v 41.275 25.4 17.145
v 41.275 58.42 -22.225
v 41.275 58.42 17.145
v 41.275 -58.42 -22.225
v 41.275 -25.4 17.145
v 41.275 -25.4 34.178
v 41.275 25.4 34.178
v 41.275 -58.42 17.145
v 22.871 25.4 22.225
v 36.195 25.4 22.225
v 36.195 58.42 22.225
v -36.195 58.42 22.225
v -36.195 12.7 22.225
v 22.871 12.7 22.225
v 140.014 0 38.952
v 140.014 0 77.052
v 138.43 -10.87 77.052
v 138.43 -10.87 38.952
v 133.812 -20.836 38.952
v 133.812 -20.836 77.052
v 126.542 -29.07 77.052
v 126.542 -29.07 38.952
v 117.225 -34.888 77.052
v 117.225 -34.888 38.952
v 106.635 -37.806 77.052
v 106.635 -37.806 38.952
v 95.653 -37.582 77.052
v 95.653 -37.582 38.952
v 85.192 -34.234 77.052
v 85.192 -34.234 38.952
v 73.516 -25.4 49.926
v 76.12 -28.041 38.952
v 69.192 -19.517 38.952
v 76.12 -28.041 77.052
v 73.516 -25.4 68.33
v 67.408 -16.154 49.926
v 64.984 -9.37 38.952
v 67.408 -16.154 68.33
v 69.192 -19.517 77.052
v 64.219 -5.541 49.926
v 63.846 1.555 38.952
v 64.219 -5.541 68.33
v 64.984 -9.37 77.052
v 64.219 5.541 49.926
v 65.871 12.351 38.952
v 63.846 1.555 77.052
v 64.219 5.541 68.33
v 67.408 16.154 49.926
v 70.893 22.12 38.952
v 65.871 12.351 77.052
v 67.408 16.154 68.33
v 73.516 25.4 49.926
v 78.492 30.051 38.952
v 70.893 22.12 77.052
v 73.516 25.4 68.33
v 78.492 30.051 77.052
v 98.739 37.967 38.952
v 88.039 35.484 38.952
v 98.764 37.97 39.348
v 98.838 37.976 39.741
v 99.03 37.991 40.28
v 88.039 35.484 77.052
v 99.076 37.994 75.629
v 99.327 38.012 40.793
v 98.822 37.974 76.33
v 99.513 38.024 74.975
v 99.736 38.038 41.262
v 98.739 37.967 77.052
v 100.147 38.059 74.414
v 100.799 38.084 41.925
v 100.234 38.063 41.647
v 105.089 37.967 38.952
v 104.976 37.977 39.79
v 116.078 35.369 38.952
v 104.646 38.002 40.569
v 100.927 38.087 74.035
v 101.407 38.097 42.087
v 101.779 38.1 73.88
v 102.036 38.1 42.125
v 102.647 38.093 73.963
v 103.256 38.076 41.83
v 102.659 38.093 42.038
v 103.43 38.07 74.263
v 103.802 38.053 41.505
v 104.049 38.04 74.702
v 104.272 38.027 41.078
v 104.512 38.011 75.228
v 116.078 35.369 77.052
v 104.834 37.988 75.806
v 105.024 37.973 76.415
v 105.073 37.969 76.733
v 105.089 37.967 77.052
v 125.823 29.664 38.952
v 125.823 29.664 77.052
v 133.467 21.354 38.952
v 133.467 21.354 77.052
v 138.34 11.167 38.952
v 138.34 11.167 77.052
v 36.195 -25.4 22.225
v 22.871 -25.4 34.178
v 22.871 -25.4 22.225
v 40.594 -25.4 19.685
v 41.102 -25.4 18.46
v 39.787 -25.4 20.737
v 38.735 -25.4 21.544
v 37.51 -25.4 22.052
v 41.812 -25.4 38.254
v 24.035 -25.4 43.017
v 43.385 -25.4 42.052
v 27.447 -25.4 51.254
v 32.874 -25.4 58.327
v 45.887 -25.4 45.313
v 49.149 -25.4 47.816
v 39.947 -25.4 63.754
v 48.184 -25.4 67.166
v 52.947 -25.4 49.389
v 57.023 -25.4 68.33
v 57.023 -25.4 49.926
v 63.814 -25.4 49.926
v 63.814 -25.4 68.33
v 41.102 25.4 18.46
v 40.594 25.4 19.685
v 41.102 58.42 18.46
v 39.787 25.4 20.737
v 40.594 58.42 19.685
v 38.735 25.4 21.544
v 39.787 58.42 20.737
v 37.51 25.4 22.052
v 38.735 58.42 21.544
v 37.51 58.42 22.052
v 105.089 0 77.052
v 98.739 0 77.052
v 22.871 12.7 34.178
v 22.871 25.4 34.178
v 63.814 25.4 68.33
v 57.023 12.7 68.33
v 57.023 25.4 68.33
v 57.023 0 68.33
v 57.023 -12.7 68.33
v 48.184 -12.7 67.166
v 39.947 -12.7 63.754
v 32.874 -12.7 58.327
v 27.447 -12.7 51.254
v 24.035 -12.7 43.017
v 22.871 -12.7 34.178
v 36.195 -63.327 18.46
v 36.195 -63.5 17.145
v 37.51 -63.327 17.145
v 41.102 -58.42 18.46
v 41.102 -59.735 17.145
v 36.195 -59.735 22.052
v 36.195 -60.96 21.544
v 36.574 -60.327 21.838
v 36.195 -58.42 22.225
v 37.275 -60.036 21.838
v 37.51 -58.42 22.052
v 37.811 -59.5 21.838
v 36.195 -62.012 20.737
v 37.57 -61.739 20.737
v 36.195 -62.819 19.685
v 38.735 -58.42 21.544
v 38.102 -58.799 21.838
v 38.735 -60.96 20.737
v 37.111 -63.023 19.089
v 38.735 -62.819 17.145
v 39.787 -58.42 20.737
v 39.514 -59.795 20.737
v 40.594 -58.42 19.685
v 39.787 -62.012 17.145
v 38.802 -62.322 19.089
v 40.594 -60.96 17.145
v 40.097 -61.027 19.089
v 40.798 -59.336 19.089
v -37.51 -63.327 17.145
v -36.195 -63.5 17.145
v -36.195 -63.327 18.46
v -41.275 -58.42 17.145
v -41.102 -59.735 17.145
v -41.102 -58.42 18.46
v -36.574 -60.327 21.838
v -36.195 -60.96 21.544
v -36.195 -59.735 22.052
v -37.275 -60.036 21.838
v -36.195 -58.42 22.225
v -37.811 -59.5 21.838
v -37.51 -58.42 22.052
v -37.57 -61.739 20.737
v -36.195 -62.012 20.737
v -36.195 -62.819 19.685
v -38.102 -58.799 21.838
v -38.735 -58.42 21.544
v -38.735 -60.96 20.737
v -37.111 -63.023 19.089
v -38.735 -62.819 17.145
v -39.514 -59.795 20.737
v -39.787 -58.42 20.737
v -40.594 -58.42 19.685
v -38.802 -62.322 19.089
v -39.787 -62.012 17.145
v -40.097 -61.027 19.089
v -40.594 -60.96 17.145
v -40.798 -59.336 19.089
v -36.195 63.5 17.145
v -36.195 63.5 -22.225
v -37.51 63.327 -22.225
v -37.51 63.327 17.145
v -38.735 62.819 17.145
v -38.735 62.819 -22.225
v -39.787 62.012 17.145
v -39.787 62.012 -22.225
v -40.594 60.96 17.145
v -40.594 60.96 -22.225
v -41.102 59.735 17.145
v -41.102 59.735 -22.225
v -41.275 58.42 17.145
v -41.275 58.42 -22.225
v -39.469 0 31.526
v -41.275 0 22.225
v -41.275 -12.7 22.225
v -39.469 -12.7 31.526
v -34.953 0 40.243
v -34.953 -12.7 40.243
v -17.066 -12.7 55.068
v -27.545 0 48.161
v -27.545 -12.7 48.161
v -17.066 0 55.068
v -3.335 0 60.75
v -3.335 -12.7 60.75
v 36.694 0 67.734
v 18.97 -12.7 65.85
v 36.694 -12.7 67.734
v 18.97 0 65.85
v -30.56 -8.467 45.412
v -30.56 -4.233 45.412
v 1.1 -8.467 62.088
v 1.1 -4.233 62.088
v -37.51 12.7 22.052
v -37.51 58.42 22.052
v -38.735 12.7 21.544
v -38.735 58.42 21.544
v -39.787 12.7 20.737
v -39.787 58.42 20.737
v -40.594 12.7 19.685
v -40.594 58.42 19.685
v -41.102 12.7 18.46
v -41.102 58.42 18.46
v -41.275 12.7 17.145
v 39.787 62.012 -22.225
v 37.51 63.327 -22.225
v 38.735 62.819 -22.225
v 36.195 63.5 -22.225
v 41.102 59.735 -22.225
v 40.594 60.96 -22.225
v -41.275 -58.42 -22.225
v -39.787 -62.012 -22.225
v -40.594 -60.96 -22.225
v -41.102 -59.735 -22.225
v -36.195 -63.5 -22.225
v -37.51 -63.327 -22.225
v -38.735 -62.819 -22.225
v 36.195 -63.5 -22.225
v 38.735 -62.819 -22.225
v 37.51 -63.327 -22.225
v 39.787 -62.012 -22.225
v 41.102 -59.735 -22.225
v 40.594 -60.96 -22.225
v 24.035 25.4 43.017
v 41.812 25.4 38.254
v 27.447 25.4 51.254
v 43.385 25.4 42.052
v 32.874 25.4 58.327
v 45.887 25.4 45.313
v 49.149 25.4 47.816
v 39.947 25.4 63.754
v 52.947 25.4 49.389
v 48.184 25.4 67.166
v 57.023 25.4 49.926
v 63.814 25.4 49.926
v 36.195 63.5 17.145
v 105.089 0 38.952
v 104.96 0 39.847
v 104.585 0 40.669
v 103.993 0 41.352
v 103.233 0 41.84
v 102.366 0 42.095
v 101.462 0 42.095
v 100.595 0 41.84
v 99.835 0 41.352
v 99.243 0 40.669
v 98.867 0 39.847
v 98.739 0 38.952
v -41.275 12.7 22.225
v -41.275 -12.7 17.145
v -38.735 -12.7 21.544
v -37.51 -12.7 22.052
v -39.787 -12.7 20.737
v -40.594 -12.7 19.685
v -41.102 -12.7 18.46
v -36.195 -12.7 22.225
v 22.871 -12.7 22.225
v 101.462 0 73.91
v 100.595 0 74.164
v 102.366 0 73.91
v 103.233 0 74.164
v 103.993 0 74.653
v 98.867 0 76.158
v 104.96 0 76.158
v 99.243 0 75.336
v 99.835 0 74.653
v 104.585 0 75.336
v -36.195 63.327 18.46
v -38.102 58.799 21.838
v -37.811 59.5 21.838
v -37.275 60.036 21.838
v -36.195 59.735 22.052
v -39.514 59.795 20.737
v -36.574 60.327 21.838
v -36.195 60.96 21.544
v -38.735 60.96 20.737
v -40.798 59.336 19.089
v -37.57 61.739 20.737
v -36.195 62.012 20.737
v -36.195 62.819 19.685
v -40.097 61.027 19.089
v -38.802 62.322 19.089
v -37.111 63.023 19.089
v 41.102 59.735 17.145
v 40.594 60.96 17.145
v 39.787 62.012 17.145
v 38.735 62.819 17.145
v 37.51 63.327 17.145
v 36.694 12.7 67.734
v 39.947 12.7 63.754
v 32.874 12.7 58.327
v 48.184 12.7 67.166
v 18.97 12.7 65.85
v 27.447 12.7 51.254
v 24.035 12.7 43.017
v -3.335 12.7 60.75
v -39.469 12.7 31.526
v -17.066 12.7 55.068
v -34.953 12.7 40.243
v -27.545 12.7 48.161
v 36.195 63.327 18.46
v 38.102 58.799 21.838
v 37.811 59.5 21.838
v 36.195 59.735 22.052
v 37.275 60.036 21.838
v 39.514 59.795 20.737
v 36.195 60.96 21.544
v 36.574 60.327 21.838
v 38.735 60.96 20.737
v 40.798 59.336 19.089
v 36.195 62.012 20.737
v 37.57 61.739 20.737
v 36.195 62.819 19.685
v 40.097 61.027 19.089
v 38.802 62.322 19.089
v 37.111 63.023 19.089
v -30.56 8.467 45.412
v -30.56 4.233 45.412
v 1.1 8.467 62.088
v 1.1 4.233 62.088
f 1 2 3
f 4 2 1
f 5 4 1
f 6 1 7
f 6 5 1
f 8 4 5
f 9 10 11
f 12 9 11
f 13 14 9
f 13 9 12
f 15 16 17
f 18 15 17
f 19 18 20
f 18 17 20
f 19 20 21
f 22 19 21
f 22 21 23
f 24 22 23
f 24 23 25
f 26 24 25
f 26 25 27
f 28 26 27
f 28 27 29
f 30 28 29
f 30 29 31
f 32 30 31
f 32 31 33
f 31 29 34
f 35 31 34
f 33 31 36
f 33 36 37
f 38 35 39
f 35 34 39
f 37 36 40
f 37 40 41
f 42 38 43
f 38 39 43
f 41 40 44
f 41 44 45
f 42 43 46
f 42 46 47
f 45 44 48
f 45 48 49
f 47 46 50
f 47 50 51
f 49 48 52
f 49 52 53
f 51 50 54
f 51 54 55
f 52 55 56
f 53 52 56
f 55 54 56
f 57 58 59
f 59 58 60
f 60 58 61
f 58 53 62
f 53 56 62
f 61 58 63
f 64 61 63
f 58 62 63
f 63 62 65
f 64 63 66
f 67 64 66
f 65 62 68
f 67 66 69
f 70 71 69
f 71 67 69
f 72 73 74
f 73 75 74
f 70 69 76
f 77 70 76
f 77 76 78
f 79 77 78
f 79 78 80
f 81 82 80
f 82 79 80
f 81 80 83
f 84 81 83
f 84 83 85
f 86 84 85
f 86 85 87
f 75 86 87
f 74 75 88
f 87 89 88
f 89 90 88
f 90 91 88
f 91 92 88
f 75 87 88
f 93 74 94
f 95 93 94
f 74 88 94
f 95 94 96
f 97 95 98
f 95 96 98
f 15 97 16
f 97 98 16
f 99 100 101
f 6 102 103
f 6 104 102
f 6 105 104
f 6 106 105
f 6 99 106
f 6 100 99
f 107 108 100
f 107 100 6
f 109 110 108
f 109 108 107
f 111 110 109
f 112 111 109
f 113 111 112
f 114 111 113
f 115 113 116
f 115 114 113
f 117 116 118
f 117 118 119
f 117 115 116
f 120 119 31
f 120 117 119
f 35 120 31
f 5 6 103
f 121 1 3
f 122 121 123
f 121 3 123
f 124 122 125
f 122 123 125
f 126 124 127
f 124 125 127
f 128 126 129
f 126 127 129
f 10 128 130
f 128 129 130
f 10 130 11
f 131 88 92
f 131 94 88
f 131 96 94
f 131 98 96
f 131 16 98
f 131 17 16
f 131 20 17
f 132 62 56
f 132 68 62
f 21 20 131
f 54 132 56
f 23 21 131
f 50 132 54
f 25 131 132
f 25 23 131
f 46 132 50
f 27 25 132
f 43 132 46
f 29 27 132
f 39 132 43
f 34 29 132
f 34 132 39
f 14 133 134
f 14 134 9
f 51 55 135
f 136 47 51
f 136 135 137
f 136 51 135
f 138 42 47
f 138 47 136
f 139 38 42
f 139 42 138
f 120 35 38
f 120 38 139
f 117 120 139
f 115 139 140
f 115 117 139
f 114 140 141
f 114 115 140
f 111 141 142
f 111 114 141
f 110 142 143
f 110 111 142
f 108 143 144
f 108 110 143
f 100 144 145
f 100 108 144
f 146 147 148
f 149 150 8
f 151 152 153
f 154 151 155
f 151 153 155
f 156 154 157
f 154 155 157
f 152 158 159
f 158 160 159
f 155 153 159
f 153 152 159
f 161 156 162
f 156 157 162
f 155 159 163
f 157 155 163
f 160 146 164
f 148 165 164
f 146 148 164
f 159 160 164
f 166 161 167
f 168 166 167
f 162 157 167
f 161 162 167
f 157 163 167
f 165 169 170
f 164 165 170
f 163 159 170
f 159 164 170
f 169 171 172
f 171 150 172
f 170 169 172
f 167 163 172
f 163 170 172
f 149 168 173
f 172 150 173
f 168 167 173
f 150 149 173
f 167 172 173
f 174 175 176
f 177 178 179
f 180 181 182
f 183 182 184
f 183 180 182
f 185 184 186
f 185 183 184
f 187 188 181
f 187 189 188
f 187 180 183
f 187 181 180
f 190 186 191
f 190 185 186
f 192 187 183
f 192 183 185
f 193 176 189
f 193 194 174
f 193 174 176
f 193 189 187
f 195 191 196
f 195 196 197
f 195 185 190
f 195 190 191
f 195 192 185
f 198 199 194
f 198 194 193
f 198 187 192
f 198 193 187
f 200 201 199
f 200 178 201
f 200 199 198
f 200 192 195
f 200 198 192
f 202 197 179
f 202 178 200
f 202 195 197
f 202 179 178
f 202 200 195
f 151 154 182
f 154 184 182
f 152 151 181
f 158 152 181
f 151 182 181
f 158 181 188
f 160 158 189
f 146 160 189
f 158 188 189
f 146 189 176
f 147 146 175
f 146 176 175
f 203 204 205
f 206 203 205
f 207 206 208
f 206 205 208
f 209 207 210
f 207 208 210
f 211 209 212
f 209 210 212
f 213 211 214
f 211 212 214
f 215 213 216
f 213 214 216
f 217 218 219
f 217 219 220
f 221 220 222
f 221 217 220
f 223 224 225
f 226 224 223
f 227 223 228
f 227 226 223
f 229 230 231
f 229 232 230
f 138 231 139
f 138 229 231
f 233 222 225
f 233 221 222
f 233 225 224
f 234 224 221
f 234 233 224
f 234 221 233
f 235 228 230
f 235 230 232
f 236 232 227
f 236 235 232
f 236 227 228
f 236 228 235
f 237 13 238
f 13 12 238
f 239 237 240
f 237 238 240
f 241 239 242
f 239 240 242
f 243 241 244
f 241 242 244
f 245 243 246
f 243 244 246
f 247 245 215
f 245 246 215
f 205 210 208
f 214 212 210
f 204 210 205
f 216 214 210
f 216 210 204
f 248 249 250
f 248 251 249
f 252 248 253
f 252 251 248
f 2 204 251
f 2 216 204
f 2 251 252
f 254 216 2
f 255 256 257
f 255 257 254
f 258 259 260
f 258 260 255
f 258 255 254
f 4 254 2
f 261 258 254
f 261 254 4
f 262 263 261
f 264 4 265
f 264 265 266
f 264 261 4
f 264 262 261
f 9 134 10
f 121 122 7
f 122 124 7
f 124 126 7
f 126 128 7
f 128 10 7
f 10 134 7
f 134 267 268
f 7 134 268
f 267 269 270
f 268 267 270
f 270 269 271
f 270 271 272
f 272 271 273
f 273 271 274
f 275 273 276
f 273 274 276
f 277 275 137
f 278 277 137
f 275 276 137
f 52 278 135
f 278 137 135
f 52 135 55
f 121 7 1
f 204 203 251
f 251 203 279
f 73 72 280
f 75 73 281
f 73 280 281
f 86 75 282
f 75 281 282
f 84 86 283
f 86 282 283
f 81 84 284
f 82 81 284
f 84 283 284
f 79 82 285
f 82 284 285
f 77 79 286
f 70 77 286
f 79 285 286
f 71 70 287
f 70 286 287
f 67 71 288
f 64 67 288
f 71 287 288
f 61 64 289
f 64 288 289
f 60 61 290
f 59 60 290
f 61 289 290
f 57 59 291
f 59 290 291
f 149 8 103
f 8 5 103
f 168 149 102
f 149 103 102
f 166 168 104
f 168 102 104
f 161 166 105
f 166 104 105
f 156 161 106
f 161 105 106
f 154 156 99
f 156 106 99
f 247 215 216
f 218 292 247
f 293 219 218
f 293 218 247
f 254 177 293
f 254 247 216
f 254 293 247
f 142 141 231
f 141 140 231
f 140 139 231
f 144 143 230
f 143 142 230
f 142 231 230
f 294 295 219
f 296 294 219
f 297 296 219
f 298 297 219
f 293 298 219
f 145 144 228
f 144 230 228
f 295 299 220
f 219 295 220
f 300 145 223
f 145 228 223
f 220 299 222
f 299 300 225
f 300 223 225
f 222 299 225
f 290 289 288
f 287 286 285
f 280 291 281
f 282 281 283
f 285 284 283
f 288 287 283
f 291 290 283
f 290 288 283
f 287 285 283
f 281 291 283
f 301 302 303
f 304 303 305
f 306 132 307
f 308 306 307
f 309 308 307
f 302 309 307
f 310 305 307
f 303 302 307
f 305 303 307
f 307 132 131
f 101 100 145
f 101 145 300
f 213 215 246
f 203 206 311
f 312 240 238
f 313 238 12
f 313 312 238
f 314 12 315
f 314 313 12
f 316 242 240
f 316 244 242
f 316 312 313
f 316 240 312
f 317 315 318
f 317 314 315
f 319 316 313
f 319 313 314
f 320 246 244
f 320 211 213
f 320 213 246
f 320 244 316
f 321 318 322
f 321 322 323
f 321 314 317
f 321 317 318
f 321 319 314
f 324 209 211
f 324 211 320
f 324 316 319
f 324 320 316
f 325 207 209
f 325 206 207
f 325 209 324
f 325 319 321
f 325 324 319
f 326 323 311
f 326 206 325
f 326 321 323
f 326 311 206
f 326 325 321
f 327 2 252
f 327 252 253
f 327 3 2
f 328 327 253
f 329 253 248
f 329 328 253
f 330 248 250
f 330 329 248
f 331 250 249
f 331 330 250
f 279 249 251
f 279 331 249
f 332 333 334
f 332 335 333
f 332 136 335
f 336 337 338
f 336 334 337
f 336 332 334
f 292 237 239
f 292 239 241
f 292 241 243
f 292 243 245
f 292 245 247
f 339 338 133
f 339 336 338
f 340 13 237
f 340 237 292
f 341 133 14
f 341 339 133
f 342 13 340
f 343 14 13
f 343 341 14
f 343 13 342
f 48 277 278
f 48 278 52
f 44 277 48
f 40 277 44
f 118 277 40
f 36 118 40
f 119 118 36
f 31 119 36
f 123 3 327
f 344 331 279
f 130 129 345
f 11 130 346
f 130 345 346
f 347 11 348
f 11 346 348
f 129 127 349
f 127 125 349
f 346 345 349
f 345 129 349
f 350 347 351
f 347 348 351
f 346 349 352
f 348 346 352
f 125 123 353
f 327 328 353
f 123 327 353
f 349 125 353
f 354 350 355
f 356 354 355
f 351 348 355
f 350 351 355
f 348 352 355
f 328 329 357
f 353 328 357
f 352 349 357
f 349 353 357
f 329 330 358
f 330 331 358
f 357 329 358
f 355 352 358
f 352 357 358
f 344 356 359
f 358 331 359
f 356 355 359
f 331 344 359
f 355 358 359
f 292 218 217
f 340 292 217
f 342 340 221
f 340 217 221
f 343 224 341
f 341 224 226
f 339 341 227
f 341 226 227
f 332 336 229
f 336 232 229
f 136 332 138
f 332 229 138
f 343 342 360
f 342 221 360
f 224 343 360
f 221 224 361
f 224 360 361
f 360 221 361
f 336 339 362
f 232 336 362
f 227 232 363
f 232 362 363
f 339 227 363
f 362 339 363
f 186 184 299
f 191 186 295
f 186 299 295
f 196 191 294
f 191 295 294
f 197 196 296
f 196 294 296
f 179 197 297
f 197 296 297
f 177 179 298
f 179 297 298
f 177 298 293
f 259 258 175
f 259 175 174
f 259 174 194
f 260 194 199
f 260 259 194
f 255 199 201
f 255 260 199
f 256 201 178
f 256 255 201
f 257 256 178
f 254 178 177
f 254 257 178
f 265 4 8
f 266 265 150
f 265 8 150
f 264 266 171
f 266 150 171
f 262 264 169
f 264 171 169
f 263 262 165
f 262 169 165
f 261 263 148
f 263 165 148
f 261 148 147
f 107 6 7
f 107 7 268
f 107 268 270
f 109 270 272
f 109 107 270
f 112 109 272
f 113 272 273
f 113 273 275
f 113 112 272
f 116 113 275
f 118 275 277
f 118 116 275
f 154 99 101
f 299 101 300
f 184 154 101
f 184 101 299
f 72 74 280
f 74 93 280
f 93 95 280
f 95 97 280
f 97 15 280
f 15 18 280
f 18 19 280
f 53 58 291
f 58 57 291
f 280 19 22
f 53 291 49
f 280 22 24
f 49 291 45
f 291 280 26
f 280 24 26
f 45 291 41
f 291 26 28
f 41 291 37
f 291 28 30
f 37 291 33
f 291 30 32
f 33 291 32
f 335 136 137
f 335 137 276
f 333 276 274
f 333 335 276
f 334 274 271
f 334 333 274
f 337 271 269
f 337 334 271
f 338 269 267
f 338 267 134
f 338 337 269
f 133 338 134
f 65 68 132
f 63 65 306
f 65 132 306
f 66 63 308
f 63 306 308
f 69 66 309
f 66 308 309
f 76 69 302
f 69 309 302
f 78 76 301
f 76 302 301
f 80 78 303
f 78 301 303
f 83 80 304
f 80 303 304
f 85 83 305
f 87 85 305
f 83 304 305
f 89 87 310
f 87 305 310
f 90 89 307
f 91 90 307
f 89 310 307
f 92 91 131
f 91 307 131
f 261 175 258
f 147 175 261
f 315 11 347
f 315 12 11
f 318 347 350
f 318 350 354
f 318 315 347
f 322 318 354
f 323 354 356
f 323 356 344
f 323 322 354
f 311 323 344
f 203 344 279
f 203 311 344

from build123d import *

# Parameters (mm, degrees)
F1_DEPTH = 63.5
F2_DEPTH = 12.7
F0_W     = 37.7701045194
F0_H     = 18.4038491807
F3_DEPTH = 25.4
F0_W_2   = 38.1
F0_H_2   = 38.1
F5_R     = 5.08
F6_D     = 6.35
F6_DEPTH = 63.501


with BuildPart() as f1:
    # F0 (on Front) → F1 (new body, symmetric)
    with BuildSketch(Plane.XZ):
        Polygon((22.8711508193, 22.2250013784), (-41.275, 22.2250013784), (-41.275, -22.2250013784), (41.275, -22.2250013784), (41.275, 22.2250013784), align=None)
    extrude(amount=F1_DEPTH, both=True)

    # F0 (on Front) → F2 (join, symmetric)
    with BuildSketch(Plane.XZ):
        with BuildLine():
            add(Edge.make_bspline(
                [(-41.275, 22.2250013784), (-39.927624166, 47.3601222038), (-12.1371774003, 68.6116442084), (57.023, 68.3297926274)],
                knots=[0, 0, 0, 0, 108.5732406264, 108.5732406264, 108.5732406264, 108.5732406264], degree=3))
            Line((-41.275, 22.2250013784), (22.8711508193, 22.2250013784))
            Line((22.8711508193, 22.2250013784), (22.8711508193, 34.1779434467))
            ThreePointArc((22.8711508193, 34.1779434467), (32.8739958543, 58.3269475924), (57.023, 68.3297926274))
        make_face()
    extrude(amount=F2_DEPTH, both=True)

    # F0 (on Front) → F3 (join, symmetric)
    with BuildSketch(Plane.XZ):
        with BuildLine():
            Line((22.8711508193, 34.1779434467), (22.8711508193, 22.2250013784))
            Line((22.8711508193, 22.2250013784), (41.275, 22.2250013784))
            Line((41.275, 22.2250013784), (41.275, 34.1779434467))
            ThreePointArc((41.275, 34.1779434467), (45.8874824099, 45.3134610369), (57.023, 49.9259434467))
            Line((57.023, 49.9259434467), (63.813790679, 49.9259434467))
            Line((63.813790679, 49.9259434467), (63.813790679, 68.3297926274))
            Line((63.813790679, 68.3297926274), (57.023, 68.3297926274))
            ThreePointArc((57.023, 68.3297926274), (32.8739958543, 58.3269475924), (22.8711508193, 34.1779434467))
        make_face()
        with Locations((82.6988429387, 59.1278680371)):
            Rectangle(F0_W, F0_H)
    extrude(amount=F3_DEPTH, both=True)

    # F0 (on Front) → F4 (revolve)
    with BuildSketch(Plane.XZ):
        with Locations((120.963790679, 58.0022351325)):
            Rectangle(F0_W_2, F0_H_2)
    revolve(axis=Axis((101.913790679, 0, 58.0022351325), (0, 0, -1)))

    # F5
    f5_edges = [f1.edges().sort_by_distance(p)[0] for p in [
        (41.275, -63.5, 0),
        (41.275, 63.5, 0),
        (-41.275, 63.5, 0),
        (-41.275, -63.5, 0),
        (0, -63.5, 22.225001),
        (-41.275, -38.1, 22.225001),
        (-41.275, 38.1, 22.225001),
        (41.275, -44.45, 22.225001),
        (41.275, 44.45, 22.225001),
        (0, 63.5, 22.225001),
    ]]
    fillet(f5_edges, radius=F5_R)

    # F6 (through all, one way)
    with BuildSketch(Plane.XZ):
        with Locations((101.913790679, 77.0522351325), (101.913790679, 38.9522351325)):
            Circle(F6_D / 2)
    extrude(amount=-F6_DEPTH, mode=Mode.SUBTRACT)


solid = f1.part
